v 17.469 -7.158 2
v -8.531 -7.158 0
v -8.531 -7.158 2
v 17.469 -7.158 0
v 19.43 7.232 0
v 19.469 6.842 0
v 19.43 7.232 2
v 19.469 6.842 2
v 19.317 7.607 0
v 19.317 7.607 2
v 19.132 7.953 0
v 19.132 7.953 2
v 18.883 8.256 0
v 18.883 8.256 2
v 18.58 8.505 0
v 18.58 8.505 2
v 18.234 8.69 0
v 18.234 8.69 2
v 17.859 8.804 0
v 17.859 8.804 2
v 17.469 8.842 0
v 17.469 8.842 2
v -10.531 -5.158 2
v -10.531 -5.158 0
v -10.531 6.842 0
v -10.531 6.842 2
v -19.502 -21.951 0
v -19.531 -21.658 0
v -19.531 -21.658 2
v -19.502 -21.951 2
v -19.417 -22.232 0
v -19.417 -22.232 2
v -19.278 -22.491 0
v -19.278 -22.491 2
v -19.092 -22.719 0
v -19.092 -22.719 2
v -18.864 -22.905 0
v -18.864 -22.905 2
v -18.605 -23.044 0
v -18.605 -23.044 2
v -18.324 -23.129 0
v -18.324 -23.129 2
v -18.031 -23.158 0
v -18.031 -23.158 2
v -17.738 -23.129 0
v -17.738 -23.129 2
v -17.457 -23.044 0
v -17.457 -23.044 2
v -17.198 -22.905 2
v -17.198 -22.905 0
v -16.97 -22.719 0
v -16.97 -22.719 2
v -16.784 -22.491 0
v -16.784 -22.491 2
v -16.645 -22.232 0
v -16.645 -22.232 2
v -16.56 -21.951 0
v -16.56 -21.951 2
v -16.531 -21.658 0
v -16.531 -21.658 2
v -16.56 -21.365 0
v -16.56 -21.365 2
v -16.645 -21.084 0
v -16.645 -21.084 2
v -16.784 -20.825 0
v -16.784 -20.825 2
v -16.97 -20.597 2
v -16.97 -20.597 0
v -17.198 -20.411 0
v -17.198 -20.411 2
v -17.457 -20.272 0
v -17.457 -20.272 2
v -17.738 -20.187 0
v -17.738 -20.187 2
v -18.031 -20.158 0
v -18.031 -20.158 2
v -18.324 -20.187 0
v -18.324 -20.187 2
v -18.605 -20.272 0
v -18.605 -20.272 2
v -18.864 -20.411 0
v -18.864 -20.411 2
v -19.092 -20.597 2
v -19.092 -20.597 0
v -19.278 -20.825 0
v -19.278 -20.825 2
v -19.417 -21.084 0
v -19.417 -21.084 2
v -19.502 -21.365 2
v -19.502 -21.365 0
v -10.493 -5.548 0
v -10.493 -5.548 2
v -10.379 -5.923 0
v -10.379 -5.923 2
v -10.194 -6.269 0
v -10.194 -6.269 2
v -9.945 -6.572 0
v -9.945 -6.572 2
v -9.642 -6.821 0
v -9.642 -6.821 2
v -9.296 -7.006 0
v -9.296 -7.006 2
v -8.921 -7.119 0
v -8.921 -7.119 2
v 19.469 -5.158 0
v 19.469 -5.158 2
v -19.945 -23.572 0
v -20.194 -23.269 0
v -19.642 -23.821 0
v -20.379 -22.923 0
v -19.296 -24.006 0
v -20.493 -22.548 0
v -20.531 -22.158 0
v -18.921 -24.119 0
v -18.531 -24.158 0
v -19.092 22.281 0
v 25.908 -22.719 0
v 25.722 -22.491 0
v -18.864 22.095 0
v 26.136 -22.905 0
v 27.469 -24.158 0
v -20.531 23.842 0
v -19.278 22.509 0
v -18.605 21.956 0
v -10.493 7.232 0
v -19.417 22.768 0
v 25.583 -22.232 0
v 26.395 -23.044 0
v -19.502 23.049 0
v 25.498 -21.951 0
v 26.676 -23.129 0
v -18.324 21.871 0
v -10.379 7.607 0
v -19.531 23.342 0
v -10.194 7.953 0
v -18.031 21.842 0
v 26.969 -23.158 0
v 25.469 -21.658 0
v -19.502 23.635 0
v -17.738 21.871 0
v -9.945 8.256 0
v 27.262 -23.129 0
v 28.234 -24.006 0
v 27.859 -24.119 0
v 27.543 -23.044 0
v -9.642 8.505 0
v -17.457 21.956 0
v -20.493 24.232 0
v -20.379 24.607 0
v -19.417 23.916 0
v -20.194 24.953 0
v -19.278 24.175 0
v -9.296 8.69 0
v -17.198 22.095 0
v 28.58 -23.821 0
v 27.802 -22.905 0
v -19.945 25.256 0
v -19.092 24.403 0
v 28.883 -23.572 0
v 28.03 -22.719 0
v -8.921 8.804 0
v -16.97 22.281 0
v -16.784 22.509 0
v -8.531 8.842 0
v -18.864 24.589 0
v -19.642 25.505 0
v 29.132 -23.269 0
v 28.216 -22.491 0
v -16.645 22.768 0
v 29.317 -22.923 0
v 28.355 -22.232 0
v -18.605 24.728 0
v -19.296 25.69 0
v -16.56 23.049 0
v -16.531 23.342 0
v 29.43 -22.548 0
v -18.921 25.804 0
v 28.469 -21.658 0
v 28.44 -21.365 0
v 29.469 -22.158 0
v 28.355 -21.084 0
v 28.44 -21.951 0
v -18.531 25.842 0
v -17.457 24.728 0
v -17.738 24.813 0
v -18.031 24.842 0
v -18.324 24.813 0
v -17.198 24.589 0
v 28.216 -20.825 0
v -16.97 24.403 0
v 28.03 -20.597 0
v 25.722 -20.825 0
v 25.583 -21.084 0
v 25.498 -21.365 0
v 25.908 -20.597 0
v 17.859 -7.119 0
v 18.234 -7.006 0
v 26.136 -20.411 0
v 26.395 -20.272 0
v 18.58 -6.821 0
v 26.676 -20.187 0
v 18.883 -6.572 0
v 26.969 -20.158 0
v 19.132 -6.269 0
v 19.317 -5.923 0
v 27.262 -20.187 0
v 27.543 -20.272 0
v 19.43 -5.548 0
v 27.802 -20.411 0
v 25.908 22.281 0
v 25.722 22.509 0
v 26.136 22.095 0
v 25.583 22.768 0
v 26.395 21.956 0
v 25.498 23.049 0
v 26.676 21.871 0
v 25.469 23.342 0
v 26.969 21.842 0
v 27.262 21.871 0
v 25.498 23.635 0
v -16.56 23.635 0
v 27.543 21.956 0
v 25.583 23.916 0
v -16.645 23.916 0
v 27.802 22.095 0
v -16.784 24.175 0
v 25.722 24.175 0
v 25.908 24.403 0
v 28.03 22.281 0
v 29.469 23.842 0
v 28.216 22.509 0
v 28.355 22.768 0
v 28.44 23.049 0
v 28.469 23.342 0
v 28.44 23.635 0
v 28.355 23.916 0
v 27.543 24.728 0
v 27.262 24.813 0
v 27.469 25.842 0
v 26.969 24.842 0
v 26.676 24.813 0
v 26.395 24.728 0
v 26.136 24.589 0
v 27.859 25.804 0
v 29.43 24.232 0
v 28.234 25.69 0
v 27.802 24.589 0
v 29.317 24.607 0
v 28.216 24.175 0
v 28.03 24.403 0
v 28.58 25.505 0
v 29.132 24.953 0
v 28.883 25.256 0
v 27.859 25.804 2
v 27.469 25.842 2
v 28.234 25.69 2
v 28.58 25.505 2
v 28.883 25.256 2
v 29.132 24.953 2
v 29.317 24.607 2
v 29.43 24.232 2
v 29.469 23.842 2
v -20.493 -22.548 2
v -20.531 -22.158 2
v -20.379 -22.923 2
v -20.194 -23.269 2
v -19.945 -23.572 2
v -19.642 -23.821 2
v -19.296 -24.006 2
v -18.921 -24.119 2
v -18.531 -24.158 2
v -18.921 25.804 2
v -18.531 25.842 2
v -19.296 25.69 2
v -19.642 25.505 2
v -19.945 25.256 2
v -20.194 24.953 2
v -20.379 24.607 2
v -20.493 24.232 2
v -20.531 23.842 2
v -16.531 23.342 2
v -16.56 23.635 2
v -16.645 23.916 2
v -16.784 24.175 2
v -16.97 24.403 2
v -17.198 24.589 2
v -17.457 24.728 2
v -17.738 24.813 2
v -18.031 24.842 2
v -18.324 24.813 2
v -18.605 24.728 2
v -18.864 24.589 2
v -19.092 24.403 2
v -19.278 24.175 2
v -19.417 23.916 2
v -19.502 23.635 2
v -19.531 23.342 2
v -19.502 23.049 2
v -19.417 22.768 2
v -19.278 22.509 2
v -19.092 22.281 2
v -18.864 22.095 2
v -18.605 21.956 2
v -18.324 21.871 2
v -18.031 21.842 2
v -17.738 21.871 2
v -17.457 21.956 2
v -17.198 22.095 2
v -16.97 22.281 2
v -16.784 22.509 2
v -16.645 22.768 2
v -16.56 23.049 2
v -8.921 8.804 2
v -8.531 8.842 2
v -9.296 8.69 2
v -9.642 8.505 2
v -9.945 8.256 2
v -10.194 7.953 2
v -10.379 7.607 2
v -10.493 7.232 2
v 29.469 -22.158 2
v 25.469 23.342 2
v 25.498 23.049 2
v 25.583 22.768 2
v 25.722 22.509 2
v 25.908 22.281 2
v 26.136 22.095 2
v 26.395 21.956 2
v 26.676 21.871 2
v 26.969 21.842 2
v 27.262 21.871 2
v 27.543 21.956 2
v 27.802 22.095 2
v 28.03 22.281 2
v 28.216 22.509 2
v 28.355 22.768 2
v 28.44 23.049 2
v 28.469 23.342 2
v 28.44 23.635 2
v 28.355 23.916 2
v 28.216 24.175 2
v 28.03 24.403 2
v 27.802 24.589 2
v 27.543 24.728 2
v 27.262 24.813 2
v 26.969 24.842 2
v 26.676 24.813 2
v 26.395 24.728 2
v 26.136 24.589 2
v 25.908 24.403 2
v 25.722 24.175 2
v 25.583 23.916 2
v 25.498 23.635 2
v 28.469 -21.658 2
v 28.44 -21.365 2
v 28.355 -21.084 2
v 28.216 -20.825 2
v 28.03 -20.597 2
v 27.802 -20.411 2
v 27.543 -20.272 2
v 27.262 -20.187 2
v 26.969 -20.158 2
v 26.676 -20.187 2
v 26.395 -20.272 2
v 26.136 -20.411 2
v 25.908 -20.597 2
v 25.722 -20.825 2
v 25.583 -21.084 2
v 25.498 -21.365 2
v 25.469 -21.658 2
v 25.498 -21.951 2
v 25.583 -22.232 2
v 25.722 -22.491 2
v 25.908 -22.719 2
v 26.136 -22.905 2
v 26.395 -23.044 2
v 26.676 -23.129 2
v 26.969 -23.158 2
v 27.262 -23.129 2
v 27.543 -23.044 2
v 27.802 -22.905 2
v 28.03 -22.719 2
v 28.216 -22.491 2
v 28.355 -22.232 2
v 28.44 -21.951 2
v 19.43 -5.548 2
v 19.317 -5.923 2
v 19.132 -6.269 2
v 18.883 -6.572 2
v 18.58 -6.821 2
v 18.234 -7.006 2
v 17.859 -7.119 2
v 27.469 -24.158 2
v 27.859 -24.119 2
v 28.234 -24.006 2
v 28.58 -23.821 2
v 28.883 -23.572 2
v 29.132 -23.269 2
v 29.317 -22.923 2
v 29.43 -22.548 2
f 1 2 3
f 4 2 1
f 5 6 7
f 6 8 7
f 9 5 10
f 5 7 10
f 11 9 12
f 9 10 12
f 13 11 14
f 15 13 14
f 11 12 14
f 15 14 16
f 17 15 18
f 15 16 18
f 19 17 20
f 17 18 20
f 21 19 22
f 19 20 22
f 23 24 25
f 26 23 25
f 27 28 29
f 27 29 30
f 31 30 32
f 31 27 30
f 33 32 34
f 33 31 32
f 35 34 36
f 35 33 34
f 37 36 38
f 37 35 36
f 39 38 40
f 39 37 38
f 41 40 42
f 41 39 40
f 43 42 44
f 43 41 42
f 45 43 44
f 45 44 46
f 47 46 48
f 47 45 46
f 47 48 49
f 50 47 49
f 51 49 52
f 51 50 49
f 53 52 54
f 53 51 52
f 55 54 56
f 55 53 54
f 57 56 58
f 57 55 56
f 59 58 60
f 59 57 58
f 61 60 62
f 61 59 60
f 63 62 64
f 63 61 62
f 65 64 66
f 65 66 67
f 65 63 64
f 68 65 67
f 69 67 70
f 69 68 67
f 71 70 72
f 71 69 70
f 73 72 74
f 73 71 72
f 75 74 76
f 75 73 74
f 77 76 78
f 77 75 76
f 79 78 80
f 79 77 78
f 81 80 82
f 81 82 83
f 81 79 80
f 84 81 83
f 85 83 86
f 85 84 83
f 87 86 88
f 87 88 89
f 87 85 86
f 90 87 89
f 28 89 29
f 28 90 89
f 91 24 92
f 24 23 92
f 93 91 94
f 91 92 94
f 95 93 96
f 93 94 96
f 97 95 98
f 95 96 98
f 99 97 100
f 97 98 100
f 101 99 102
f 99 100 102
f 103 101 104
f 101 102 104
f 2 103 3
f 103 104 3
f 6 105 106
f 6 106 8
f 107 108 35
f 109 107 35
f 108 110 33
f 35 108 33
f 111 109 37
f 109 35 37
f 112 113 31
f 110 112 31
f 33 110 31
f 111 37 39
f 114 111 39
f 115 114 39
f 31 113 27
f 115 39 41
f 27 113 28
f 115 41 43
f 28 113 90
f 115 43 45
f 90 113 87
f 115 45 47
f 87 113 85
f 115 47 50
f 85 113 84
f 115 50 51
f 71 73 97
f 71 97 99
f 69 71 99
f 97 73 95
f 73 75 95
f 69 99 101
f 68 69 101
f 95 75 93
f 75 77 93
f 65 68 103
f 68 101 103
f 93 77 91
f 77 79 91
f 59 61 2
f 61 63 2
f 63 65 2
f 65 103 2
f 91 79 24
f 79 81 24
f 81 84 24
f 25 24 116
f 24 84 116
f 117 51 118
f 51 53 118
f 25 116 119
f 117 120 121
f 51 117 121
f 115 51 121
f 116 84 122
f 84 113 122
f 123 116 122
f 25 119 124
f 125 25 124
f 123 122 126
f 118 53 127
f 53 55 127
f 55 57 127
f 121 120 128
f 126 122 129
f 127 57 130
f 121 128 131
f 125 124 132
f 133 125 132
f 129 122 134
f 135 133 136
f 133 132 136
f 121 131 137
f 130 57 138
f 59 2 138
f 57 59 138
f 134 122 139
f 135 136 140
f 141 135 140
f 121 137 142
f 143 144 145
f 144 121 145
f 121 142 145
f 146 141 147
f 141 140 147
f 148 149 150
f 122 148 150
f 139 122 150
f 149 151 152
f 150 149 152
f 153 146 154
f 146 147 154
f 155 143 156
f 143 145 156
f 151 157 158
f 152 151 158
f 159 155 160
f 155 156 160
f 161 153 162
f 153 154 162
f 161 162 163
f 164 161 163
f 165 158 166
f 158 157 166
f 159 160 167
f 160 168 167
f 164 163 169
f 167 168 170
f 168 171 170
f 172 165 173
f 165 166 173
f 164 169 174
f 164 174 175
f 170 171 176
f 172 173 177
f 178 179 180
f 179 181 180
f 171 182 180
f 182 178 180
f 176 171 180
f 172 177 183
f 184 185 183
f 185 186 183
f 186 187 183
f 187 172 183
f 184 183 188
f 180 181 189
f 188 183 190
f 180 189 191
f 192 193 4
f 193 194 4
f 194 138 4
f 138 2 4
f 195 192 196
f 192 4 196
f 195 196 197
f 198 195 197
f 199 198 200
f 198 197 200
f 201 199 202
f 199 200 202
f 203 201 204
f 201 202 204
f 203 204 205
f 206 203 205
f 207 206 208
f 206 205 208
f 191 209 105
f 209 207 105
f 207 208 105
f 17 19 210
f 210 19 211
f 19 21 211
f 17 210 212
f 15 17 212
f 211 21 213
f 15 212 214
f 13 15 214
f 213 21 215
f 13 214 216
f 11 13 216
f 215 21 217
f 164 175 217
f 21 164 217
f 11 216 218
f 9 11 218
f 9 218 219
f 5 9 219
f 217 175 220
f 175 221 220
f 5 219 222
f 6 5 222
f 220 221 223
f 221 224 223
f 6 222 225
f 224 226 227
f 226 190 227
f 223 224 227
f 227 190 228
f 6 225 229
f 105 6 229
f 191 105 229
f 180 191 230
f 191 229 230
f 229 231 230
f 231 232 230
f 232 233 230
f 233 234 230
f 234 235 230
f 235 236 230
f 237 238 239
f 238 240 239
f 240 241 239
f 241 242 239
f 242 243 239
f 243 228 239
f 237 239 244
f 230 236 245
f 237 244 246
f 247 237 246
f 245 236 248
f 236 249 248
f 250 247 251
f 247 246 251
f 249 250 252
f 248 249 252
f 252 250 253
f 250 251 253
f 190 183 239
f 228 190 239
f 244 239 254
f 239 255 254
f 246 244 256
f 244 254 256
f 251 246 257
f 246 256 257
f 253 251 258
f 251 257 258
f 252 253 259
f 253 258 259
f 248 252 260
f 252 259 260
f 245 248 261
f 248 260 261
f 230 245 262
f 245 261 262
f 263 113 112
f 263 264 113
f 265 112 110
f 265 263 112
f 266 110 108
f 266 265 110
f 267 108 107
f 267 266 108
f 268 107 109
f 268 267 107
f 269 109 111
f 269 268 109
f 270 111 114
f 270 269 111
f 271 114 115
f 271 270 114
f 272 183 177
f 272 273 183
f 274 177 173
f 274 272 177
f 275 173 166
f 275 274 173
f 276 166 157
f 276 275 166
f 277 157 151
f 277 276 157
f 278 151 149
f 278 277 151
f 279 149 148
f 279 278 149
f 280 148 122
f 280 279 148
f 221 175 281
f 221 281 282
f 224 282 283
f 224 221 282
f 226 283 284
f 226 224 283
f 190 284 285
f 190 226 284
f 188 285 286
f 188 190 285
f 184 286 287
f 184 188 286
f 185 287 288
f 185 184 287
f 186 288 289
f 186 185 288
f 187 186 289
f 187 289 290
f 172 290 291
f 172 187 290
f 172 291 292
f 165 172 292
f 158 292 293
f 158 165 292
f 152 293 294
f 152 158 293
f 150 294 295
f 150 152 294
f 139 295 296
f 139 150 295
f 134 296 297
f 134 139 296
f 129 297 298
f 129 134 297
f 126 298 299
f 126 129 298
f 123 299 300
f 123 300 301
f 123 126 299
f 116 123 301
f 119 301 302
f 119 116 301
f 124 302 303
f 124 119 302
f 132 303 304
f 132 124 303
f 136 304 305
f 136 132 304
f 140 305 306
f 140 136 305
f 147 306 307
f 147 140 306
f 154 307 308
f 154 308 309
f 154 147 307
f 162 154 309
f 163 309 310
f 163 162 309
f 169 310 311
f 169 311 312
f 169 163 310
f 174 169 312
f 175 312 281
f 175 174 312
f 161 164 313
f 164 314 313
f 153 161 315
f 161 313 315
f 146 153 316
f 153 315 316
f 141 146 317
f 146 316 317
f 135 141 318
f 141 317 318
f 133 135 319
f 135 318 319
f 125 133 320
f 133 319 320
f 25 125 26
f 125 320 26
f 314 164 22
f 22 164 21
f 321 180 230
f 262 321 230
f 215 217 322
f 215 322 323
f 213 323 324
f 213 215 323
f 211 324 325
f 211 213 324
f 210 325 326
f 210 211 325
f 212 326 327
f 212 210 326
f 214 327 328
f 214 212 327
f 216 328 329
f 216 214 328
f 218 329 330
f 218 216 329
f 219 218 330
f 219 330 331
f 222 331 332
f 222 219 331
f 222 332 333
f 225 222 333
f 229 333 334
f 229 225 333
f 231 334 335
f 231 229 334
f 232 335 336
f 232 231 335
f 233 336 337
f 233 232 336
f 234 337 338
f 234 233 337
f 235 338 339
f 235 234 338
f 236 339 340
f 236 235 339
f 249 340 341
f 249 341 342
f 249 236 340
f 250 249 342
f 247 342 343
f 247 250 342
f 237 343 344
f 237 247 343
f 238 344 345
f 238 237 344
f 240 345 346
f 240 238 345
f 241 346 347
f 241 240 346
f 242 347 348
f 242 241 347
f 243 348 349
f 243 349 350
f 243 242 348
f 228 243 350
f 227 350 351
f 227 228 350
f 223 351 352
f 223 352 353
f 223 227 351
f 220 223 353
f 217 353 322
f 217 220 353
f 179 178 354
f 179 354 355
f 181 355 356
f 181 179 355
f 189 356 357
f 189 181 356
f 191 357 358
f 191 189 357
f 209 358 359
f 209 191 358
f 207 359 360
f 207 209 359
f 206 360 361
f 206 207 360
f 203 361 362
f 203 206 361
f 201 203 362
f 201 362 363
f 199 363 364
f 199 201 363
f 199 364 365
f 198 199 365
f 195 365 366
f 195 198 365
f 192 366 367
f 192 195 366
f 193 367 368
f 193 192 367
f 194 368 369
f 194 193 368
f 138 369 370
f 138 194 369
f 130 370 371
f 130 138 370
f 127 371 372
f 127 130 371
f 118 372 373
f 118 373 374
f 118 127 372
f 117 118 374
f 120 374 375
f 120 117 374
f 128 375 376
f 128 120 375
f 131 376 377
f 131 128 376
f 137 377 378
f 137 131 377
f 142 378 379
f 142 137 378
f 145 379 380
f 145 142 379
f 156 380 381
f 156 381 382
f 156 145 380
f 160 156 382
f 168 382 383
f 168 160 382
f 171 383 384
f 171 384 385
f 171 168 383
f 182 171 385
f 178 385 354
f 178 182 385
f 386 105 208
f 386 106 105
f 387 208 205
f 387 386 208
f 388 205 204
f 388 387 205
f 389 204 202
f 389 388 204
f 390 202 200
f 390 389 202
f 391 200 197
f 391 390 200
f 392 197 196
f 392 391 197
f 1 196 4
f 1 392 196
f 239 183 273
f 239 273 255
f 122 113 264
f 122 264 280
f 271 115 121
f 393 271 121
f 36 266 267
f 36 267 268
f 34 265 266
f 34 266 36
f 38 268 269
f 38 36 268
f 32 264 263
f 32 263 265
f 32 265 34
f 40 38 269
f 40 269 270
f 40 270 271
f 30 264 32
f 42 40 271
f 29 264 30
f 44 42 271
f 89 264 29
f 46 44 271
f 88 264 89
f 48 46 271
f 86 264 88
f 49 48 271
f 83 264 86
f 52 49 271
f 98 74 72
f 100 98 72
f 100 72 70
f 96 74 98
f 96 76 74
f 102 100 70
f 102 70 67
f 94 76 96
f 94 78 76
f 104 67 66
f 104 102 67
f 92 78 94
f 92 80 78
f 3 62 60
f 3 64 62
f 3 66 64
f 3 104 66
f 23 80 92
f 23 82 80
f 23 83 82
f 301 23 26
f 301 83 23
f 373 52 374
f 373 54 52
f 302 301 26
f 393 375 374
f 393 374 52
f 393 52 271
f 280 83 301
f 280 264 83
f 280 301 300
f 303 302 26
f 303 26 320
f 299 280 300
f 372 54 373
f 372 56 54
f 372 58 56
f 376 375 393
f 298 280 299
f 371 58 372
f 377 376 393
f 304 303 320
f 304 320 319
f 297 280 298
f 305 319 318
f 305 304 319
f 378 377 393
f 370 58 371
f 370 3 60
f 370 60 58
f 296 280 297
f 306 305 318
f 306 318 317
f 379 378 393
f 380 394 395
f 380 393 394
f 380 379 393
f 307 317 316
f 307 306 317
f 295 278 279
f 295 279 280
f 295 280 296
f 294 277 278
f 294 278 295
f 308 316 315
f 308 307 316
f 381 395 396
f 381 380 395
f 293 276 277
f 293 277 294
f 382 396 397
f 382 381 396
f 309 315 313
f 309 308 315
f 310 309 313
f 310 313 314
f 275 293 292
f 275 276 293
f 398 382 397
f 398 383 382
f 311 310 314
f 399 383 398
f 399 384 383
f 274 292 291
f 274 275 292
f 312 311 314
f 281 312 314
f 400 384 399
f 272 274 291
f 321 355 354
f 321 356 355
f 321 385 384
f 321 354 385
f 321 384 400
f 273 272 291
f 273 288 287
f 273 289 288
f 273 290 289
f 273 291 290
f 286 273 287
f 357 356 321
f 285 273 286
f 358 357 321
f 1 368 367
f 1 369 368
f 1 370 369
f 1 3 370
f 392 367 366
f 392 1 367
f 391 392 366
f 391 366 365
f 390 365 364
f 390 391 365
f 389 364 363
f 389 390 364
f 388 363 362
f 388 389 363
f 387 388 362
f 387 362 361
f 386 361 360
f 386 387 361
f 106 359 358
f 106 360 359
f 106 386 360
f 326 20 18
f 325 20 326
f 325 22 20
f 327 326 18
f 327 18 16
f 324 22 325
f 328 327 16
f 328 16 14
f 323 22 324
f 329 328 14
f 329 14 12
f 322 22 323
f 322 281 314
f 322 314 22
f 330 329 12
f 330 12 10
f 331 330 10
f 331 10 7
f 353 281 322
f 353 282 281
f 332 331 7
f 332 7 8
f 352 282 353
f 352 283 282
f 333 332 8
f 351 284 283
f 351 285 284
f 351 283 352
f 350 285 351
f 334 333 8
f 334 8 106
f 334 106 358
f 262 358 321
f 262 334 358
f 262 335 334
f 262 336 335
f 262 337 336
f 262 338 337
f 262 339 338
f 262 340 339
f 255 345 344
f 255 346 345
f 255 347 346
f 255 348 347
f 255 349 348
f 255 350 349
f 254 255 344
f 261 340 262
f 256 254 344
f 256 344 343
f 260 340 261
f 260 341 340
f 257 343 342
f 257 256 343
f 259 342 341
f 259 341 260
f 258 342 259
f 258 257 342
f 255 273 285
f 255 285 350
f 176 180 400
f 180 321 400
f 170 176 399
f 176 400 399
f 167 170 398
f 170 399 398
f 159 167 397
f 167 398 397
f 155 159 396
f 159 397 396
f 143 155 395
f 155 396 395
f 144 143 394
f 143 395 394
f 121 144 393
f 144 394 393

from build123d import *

# Parameters (mm, degrees)
SKETCH_1_W      = 50
SKETCH_1_H      = 50
SKETCH_1_R      = 1.5
SKETCH_1_W_2    = 30
SKETCH_1_H_2    = 16
EXTRUDE_1_DEPTH = 2
FILLET_1_R      = 2
FILLET_2_R      = 2
FILLET_3_R      = 2
FILLET_4_R      = 2
FILLET_5_R      = 2
FILLET_6_R      = 2
FILLET_7_R      = 2
FILLET_8_R      = 2


with BuildPart() as part:
    # 草图1 → 凸台-拉伸1 (new body)
    with BuildSketch(Plane.XY):
        with Locations((4.468911917, 0.842132209)):
            Rectangle(SKETCH_1_W, SKETCH_1_H)
        with Locations((-18.031088083, 23.342132209)):
            Circle(SKETCH_1_R, mode=Mode.SUBTRACT)
        with Locations(Location((26.968911917, 23.342132209, 0), (0, 0, 180))):
            Circle(SKETCH_1_R, mode=Mode.SUBTRACT)
        with Locations((26.968911917, -21.657867791)):
            Circle(SKETCH_1_R, mode=Mode.SUBTRACT)
        with Locations(Location((-18.031088083, -21.657867791, 0), (0, 0, 180))):
            Circle(SKETCH_1_R, mode=Mode.SUBTRACT)
        with Locations((4.468911917, 0.842132209)):
            Rectangle(SKETCH_1_W_2, SKETCH_1_H_2, mode=Mode.SUBTRACT)
    extrude(amount=EXTRUDE_1_DEPTH)

    # 圆角1
    fillet_1_edges = [part.edges().sort_by_distance(p)[0] for p in [
        (19.468911917, 8.842132209, 1),
    ]]
    fillet(fillet_1_edges, radius=FILLET_1_R)

    # 圆角2
    fillet_2_edges = [part.edges().sort_by_distance(p)[0] for p in [
        (19.468911917, -7.157867791, 1),
    ]]
    fillet(fillet_2_edges, radius=FILLET_2_R)

    # 圆角3
    fillet_3_edges = [part.edges().sort_by_distance(p)[0] for p in [
        (-10.531088083, 8.842132209, 1),
    ]]
    fillet(fillet_3_edges, radius=FILLET_3_R)

    # 圆角4
    fillet_4_edges = [part.edges().sort_by_distance(p)[0] for p in [
        (-10.531088083, -7.157867791, 1),
    ]]
    fillet(fillet_4_edges, radius=FILLET_4_R)

    # 圆角5
    fillet_5_edges = [part.edges().sort_by_distance(p)[0] for p in [
        (29.468911917, 25.842132209, 1),
    ]]
    fillet(fillet_5_edges, radius=FILLET_5_R)

    # 圆角6
    fillet_6_edges = [part.edges().sort_by_distance(p)[0] for p in [
        (29.468911917, -24.157867791, 1),
    ]]
    fillet(fillet_6_edges, radius=FILLET_6_R)

    # 圆角7
    fillet_7_edges = [part.edges().sort_by_distance(p)[0] for p in [
        (-20.531088083, 25.842132209, 1),
    ]]
    fillet(fillet_7_edges, radius=FILLET_7_R)

    # 圆角8
    fillet_8_edges = [part.edges().sort_by_distance(p)[0] for p in [
        (-20.531088083, -24.157867791, 1),
    ]]
    fillet(fillet_8_edges, radius=FILLET_8_R)


solid = part.part
